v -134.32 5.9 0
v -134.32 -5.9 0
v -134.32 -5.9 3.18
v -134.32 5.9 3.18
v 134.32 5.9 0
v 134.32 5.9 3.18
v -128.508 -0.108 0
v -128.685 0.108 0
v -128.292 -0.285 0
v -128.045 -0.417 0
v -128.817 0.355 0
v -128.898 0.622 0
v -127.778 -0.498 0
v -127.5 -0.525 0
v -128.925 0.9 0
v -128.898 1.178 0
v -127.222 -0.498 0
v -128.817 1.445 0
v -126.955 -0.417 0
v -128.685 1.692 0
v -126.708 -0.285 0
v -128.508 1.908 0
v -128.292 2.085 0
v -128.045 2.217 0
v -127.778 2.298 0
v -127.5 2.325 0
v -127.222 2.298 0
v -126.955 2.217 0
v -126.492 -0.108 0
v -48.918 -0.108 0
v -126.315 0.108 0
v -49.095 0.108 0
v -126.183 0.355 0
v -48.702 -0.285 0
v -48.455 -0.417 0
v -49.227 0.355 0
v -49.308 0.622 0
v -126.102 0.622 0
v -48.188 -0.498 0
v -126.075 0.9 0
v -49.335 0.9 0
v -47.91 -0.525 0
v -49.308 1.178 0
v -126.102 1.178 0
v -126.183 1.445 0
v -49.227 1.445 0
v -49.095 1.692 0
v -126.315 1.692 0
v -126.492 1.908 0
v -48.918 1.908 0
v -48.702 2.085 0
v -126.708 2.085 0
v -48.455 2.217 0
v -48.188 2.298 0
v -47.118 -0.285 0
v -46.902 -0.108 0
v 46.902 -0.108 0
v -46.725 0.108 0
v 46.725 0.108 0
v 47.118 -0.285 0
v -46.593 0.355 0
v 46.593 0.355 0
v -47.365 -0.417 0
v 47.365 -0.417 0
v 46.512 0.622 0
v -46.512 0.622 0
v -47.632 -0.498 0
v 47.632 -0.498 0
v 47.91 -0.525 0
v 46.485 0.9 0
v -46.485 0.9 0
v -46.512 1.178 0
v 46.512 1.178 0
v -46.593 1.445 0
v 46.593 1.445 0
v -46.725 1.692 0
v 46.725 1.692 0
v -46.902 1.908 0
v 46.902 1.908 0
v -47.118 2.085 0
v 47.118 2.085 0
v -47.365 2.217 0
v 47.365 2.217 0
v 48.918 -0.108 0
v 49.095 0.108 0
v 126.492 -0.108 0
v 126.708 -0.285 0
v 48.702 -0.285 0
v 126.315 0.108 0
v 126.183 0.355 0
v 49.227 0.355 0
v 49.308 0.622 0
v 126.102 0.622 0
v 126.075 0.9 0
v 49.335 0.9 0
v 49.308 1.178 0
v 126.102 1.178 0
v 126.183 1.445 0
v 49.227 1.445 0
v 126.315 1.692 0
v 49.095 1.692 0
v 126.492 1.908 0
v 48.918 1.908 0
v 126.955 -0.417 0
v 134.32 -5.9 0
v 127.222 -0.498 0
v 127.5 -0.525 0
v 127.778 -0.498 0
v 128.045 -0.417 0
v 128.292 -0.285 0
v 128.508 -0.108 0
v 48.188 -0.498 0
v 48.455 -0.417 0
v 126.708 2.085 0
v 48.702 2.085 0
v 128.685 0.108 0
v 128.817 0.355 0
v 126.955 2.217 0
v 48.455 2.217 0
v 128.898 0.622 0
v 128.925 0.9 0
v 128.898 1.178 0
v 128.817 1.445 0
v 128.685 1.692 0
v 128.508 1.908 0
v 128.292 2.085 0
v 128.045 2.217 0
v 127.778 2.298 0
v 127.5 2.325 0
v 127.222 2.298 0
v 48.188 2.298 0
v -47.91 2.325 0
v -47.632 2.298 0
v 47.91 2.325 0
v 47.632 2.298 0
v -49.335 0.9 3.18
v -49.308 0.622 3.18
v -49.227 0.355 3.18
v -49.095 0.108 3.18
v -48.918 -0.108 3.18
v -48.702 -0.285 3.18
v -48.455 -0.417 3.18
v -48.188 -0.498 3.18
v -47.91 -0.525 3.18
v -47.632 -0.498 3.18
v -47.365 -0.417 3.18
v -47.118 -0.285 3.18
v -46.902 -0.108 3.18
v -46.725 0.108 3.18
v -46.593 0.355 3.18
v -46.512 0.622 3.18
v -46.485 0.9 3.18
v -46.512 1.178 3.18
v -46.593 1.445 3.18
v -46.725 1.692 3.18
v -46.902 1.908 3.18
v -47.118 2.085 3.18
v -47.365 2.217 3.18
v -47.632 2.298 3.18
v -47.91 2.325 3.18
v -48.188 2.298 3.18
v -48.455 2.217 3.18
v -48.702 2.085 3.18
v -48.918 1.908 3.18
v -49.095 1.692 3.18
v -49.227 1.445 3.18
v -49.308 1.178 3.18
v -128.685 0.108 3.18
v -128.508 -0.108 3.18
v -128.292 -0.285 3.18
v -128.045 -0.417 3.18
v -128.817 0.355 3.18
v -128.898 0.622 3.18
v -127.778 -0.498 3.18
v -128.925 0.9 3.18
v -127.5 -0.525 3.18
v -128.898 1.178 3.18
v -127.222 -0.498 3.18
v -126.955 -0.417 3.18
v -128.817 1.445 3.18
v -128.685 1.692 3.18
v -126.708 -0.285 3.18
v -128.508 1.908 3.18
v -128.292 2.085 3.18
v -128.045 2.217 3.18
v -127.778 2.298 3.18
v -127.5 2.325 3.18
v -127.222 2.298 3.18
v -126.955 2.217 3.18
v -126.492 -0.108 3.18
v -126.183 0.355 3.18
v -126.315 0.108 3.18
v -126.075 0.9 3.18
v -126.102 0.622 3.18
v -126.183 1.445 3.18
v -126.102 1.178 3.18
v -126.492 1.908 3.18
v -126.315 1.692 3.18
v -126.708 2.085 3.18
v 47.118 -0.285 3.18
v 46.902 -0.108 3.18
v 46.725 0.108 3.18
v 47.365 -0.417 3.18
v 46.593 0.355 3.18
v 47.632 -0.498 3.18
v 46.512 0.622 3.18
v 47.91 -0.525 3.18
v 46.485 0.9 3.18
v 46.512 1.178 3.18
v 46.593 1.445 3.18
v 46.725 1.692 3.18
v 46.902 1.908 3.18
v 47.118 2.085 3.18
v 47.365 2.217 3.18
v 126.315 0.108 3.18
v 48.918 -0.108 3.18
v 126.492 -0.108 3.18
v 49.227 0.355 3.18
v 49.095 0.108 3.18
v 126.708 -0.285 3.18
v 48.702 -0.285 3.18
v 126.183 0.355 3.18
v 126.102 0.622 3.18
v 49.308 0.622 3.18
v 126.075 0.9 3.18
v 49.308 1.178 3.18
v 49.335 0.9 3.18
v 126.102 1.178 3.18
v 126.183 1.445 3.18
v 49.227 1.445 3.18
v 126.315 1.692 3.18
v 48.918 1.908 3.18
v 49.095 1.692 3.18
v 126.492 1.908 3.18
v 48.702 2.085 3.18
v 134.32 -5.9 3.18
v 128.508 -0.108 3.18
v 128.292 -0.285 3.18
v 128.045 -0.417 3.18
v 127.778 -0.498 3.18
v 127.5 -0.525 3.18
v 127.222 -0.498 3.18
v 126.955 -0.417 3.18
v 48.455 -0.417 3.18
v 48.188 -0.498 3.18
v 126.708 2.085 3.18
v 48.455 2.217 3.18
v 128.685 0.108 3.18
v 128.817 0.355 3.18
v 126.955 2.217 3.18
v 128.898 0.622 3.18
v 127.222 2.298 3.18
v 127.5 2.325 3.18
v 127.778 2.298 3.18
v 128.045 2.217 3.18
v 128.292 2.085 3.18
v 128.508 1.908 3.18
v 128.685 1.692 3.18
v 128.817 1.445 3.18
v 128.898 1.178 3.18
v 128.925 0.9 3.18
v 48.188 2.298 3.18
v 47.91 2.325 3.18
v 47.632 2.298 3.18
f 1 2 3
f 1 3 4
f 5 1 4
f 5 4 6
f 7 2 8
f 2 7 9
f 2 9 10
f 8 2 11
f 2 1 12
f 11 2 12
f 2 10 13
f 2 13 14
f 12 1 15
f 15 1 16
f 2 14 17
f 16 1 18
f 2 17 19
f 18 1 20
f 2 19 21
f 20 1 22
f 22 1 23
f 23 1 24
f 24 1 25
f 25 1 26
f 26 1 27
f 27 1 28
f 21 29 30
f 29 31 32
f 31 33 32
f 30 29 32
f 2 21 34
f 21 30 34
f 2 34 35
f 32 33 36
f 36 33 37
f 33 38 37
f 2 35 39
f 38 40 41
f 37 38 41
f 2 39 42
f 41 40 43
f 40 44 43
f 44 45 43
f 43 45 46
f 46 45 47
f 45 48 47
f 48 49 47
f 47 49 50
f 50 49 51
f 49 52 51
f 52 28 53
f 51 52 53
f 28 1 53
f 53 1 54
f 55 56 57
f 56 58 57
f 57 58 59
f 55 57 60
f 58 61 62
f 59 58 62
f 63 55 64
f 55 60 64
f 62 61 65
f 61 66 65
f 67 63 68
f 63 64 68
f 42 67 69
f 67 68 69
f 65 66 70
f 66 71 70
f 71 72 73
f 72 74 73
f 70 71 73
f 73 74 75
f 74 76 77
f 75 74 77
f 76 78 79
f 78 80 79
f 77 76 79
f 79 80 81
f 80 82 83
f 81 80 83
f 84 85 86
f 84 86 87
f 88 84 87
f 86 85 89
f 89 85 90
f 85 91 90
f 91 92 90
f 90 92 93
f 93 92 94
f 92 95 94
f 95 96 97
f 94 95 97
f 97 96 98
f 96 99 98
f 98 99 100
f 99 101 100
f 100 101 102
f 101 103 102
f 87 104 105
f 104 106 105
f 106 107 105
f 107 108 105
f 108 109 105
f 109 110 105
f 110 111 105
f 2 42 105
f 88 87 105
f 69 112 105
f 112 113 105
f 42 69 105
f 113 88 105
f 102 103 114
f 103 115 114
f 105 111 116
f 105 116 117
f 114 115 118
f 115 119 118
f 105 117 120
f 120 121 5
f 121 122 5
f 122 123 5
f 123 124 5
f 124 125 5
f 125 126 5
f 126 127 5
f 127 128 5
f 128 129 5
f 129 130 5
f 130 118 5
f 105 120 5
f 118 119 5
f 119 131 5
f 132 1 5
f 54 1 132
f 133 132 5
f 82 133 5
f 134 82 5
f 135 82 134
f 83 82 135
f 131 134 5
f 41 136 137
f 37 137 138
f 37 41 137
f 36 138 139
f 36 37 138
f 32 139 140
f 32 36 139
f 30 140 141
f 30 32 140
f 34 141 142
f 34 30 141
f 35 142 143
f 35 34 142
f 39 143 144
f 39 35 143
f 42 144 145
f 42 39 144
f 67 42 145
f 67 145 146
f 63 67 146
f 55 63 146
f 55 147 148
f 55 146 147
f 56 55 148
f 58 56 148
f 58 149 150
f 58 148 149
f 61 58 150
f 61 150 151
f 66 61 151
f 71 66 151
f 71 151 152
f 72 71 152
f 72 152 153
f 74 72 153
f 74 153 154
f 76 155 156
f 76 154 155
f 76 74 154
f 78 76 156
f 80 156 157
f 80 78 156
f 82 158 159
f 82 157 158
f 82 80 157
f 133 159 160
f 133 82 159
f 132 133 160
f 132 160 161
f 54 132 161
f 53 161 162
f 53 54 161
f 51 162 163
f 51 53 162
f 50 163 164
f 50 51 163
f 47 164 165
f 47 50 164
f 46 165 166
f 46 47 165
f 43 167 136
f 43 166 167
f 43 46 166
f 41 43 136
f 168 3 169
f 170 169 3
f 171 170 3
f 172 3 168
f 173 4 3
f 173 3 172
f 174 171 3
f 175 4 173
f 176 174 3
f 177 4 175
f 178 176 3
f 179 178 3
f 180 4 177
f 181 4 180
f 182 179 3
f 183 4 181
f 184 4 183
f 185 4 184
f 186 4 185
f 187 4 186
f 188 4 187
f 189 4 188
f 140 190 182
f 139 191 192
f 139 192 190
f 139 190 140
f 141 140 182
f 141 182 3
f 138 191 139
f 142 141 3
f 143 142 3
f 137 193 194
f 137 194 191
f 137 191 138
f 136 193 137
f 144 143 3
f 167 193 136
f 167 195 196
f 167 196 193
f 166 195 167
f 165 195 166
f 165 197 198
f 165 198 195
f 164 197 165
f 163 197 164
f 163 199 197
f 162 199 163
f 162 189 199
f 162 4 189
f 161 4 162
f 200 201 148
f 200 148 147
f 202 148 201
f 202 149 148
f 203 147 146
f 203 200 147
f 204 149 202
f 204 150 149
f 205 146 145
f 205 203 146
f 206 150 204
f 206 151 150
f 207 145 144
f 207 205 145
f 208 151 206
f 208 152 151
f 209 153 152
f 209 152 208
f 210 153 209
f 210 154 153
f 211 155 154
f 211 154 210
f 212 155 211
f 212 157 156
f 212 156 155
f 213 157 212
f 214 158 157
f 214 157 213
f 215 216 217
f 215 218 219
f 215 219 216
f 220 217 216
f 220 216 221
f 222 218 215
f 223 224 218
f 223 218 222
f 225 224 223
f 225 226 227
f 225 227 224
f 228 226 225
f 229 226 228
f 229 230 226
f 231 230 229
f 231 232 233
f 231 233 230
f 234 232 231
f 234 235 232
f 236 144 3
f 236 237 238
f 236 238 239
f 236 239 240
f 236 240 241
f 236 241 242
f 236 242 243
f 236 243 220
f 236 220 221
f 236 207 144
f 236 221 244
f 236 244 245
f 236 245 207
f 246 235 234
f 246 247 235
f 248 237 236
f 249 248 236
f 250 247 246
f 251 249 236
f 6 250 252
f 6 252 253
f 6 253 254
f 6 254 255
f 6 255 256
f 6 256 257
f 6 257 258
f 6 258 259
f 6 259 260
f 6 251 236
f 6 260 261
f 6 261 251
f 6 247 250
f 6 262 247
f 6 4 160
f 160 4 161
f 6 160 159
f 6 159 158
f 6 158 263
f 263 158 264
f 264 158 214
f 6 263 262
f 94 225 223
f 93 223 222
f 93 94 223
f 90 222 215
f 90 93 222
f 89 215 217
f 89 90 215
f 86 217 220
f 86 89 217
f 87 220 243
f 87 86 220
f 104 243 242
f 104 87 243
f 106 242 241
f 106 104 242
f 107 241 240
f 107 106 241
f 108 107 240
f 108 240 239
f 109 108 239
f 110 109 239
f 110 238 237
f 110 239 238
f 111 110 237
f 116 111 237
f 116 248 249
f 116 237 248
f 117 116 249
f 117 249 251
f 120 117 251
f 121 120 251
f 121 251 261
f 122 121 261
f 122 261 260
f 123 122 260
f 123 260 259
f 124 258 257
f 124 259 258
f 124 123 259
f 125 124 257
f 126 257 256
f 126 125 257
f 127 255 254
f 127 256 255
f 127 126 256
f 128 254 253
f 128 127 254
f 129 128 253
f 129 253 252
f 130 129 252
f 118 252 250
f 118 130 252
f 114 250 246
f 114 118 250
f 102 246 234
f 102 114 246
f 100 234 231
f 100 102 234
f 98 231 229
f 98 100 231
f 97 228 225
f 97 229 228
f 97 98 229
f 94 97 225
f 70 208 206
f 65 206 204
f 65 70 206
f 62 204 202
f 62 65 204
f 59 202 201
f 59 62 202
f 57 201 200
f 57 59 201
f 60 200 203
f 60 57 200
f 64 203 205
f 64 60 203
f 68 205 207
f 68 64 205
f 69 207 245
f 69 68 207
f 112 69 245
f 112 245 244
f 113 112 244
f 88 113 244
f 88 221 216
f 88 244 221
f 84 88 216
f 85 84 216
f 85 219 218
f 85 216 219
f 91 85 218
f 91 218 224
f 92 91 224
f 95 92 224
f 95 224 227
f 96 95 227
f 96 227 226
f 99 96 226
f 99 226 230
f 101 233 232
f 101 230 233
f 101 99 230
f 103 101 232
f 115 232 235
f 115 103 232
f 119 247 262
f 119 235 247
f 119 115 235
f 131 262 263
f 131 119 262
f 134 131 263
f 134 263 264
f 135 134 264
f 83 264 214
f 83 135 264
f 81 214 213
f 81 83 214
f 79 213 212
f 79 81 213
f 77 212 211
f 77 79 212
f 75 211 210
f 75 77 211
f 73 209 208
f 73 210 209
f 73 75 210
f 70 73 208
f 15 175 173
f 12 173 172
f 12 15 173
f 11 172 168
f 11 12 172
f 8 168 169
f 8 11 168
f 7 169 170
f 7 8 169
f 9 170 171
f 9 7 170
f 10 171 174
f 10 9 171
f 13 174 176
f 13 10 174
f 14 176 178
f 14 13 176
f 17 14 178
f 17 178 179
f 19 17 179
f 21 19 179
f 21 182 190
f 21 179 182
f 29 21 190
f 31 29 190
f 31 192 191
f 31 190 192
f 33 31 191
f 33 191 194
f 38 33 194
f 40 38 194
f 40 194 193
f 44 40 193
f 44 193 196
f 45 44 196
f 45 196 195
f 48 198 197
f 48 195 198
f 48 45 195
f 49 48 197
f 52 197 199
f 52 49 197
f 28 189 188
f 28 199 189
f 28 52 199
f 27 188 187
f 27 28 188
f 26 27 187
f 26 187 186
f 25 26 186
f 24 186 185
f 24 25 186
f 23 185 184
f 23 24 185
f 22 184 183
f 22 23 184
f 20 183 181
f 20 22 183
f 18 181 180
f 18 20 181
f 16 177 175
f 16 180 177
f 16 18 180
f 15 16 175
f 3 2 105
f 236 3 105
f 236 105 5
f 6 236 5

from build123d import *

# Parameters (mm, degrees)
SKETCH1_W           = 268.64
SKETCH1_H           = 11.8
BOSS_EXTRUDE1_DEPTH = 3.18
CUT_EXTRUDE1_REACH  = 136.487
SKETCH3_R           = 1.425


with BuildPart() as part:
    # Sketch1 → Boss-Extrude1 (new body)
    with BuildSketch(Plane.XY):
        Rectangle(SKETCH1_W, SKETCH1_H)
    extrude(amount=BOSS_EXTRUDE1_DEPTH)

    # Sketch3 → Cut-Extrude1 (cut, up to next)
    with BuildSketch(Plane.XY, mode=Mode.PRIVATE) as cut_extrude1_sk1:
        with Locations(Location((127.5, 0.9, 0), (0, 0, 180))):
            Circle(SKETCH3_R)
    cut_extrude1_tool1 = extrude(cut_extrude1_sk1.sketch, amount=CUT_EXTRUDE1_REACH, mode=Mode.PRIVATE) & part.part
    # Sketch3 → Cut-Extrude1 (cut, up to next)
    with BuildSketch(Plane.XY, mode=Mode.PRIVATE) as cut_extrude1_sk2:
        with Locations(Location((47.91, 0.9, 0), (0, 0, 180))):
            Circle(SKETCH3_R)
    cut_extrude1_tool2 = extrude(cut_extrude1_sk2.sketch, amount=CUT_EXTRUDE1_REACH, mode=Mode.PRIVATE) & part.part
    # Sketch3 → Cut-Extrude1 (cut, up to next)
    with BuildSketch(Plane.XY, mode=Mode.PRIVATE) as cut_extrude1_sk3:
        with Locations(Location((-47.91, 0.9, 0), (0, 0, 180))):
            Circle(SKETCH3_R)
    cut_extrude1_tool3 = extrude(cut_extrude1_sk3.sketch, amount=CUT_EXTRUDE1_REACH, mode=Mode.PRIVATE) & part.part
    # Sketch3 → Cut-Extrude1 (cut, up to next)
    with BuildSketch(Plane.XY, mode=Mode.PRIVATE) as cut_extrude1_sk4:
        with Locations(Location((-127.5, 0.9, 0), (0, 0, 180))):
            Circle(SKETCH3_R)
    cut_extrude1_tool4 = extrude(cut_extrude1_sk4.sketch, amount=CUT_EXTRUDE1_REACH, mode=Mode.PRIVATE) & part.part
    add(cut_extrude1_tool1.solids().sort_by_distance((127.5, 0.9, 0))[0], mode=Mode.SUBTRACT)
    add(cut_extrude1_tool2.solids().sort_by_distance((47.91, 0.9, 0))[0], mode=Mode.SUBTRACT)
    add(cut_extrude1_tool3.solids().sort_by_distance((-47.91, 0.9, 0))[0], mode=Mode.SUBTRACT)
    add(cut_extrude1_tool4.solids().sort_by_distance((-127.5, 0.9, 0))[0], mode=Mode.SUBTRACT)


solid = part.part
